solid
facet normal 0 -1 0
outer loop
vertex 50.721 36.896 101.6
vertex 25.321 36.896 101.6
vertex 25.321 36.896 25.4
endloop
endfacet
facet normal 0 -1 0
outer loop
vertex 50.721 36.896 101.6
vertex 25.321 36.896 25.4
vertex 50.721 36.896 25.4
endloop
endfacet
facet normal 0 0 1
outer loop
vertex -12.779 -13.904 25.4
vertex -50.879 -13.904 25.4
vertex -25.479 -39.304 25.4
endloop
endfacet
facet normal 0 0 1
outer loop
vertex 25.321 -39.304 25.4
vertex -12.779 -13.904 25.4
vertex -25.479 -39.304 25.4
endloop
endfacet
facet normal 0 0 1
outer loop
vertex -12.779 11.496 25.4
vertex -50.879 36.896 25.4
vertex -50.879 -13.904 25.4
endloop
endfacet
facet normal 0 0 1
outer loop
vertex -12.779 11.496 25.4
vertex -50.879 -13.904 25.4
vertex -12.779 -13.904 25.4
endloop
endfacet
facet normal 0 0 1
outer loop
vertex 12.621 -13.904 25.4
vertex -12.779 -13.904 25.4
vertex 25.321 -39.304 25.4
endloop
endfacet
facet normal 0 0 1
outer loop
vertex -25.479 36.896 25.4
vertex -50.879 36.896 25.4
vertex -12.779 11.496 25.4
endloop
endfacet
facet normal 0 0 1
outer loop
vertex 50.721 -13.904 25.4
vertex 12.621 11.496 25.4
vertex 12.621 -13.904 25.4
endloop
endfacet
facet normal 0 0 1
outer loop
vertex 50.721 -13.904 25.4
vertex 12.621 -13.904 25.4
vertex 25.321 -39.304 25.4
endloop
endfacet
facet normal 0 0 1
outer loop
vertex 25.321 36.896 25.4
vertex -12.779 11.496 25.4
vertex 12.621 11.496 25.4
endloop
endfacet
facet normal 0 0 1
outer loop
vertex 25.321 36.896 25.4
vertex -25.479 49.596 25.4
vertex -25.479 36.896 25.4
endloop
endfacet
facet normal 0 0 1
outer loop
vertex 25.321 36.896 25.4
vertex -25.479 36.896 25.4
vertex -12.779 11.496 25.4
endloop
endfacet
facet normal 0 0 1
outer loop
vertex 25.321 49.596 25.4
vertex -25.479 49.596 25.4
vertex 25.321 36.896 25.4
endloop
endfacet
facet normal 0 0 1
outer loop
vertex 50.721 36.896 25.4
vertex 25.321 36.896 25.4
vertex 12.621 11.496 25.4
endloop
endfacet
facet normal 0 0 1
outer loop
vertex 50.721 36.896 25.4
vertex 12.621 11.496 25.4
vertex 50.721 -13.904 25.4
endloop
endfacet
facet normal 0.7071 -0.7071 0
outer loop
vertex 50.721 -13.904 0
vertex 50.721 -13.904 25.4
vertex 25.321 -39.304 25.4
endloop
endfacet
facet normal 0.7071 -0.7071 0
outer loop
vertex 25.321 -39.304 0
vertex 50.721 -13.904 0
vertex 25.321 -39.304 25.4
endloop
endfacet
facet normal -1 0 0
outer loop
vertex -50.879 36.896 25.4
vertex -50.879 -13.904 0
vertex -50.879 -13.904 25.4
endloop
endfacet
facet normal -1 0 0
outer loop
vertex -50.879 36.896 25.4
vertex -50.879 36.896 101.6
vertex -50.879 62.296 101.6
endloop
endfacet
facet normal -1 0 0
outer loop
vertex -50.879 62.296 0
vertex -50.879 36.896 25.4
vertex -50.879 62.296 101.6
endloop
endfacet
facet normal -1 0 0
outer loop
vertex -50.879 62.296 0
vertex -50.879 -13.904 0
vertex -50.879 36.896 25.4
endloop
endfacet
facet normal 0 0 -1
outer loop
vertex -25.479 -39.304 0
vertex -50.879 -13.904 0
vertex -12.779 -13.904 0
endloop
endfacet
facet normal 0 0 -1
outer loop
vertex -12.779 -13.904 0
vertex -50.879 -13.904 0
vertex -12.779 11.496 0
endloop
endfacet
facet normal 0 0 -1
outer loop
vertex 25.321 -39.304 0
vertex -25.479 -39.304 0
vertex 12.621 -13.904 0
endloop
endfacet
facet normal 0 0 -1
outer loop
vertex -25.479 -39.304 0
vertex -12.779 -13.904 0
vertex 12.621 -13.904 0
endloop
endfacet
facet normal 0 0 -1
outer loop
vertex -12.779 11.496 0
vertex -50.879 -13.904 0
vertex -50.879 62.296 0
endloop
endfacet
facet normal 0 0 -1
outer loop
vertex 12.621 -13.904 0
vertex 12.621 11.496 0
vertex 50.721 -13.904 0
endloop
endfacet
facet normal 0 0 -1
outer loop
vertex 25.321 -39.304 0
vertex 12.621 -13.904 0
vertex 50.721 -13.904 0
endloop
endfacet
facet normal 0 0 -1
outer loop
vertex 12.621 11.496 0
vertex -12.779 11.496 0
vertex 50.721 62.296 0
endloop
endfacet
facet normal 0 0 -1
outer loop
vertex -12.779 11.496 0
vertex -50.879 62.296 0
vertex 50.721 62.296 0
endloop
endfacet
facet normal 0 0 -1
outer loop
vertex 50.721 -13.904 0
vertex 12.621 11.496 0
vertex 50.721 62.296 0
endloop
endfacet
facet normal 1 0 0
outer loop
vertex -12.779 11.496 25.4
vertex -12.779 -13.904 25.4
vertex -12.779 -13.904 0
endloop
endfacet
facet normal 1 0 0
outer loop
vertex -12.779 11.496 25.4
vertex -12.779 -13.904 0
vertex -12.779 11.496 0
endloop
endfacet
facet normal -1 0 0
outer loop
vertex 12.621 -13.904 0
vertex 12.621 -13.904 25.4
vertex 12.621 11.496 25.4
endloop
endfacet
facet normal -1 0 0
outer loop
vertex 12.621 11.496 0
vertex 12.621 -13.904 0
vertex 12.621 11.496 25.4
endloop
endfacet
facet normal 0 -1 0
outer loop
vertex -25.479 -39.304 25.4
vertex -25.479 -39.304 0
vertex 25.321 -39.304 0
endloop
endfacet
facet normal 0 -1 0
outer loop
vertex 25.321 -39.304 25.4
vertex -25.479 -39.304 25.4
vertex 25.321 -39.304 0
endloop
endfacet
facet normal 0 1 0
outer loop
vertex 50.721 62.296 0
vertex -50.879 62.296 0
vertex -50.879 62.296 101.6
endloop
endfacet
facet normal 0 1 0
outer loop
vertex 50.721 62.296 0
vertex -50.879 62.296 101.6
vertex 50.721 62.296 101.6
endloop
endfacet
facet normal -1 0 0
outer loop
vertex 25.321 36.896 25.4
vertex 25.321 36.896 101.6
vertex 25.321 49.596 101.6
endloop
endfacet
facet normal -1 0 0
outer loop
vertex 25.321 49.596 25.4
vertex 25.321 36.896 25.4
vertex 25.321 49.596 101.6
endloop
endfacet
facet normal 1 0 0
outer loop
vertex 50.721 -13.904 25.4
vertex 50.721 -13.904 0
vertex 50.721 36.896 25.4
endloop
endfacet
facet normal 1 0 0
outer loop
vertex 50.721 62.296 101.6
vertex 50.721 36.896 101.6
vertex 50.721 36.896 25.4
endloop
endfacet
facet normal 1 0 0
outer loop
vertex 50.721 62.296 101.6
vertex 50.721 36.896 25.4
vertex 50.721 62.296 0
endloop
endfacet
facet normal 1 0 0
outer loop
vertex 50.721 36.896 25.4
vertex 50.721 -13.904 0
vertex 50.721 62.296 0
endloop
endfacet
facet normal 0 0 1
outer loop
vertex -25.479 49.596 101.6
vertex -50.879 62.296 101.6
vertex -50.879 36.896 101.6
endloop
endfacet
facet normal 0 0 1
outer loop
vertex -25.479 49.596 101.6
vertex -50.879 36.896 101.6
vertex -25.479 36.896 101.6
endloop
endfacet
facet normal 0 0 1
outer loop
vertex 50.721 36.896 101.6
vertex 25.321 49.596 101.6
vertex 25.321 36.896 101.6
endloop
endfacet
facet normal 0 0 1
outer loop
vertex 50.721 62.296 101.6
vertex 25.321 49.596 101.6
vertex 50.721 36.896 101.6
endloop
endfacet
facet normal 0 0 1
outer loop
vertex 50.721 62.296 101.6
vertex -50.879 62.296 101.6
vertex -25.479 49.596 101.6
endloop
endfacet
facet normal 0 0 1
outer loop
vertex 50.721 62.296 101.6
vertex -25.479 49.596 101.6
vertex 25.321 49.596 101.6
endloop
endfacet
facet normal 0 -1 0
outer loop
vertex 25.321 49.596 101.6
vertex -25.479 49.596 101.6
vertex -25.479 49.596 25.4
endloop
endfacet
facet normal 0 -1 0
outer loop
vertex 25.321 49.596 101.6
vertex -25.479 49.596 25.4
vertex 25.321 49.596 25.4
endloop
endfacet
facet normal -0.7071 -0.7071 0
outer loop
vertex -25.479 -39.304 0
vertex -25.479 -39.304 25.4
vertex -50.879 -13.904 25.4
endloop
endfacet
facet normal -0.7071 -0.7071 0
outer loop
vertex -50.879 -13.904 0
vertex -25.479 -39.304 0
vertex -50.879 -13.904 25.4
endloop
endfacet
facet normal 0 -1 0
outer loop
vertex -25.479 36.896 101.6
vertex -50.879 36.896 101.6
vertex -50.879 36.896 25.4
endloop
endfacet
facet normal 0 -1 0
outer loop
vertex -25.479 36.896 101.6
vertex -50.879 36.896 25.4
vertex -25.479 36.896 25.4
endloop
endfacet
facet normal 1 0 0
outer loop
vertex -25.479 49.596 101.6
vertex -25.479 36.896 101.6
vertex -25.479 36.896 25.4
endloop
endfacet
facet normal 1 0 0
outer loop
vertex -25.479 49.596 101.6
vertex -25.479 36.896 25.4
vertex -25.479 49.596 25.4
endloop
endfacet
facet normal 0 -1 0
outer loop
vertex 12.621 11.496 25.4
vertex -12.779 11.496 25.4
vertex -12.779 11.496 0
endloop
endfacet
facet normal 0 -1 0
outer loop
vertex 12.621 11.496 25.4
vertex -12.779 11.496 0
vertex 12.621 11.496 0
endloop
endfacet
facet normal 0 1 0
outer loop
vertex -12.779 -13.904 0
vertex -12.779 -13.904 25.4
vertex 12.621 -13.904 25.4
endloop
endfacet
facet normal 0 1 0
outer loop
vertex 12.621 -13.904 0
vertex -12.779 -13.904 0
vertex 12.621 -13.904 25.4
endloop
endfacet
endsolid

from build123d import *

# Parameters (mm, degrees)
F0_W     = 101.6
F0_H     = 101.6
F1_DEPTH = 101.6
F2_W     = 101.6
F2_H     = 76.2
F3_DEPTH = 76.2
F4_W     = 50.8
F4_H     = 12.7
F5_DEPTH = 76.2
F6_W     = 25.4
F6_H     = 25.4
F7_DEPTH = 75.438
F9_DEPTH = 57.912


with BuildPart() as f1:
    # F0 (on Top) → F1 (new body)
    with BuildSketch(Plane.XY):
        with Locations((-0.078824, 11.495703)):
            Rectangle(F0_W, F0_H)
    extrude(amount=F1_DEPTH)

    # F2 (on face) → F3 (cut)
    with BuildSketch(Plane.XY.offset(101.6)):
        with Locations((-0.078824, -1.204297)):
            Rectangle(F2_W, F2_H)
    extrude(amount=-F3_DEPTH, mode=Mode.SUBTRACT)

    # F4 (on face) → F5 (cut)
    with BuildSketch(Plane.XY.offset(101.6)):
        with Locations((-0.078824, 43.245703)):
            Rectangle(F4_W, F4_H)
    extrude(amount=-F5_DEPTH, mode=Mode.SUBTRACT)

    # F6 (on face) → F7 (cut)
    with BuildSketch(Plane.XY.offset(25.4)):
        with Locations((-0.078824, -1.204297)):
            Rectangle(F6_W, F6_H)
    extrude(amount=-F7_DEPTH, mode=Mode.SUBTRACT)

    # F8 (on face) → F9 (cut)
    with BuildSketch(Plane.XY.offset(25.4)):
        Polygon((-50.878824, -13.904297), (-50.878824, -39.304297), (-25.478824, -39.304297), align=None)
        Polygon((25.321176, -39.304297), (50.721176, -39.304297), (50.721176, -13.904297), align=None)
    extrude(amount=-F9_DEPTH, mode=Mode.SUBTRACT)


solid = f1.part
